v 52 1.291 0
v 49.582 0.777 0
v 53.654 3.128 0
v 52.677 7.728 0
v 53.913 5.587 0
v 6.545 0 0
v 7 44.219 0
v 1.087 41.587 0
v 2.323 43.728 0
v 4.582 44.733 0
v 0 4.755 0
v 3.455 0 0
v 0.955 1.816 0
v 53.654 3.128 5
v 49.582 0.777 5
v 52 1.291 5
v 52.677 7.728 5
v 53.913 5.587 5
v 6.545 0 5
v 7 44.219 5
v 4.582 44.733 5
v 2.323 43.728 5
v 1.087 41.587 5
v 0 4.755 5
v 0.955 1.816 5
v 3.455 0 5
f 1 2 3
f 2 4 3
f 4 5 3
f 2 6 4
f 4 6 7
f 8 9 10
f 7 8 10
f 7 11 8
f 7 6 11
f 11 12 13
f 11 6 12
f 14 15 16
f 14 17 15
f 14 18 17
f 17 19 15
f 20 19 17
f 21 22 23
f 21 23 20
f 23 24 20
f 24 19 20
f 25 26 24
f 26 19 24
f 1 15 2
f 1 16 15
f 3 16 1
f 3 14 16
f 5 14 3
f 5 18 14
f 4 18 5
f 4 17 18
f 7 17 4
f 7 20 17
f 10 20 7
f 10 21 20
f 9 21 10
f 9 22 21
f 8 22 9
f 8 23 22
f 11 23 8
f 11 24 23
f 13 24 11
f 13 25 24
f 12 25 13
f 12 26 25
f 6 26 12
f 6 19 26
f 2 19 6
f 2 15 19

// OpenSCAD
$fn = 32;

// ----------------------------------------------------------------------
// Lever arm: two bosses 10 and 8 mm, 45 mm between centres
// ----------------------------------------------------------------------

// --- parameters (mm) ---
profile_height = 5;       // extrusion height
profile_points = 13;      // points of the closed outline

profile = [[0, 4.755], [0.955, 1.816], [3.455, 0], [6.545, 0], [49.582, 0.777], [52, 1.291], [53.654, 3.128], [53.913, 5.587], [52.677, 7.728], [7, 44.219], [4.582, 44.733], [2.323, 43.728], [1.087, 41.587]];  // single closed polygon, 13 points, counter clockwise

// --- the one profile operation ---
linear_extrude(height = profile_height) polygon(points = profile);
